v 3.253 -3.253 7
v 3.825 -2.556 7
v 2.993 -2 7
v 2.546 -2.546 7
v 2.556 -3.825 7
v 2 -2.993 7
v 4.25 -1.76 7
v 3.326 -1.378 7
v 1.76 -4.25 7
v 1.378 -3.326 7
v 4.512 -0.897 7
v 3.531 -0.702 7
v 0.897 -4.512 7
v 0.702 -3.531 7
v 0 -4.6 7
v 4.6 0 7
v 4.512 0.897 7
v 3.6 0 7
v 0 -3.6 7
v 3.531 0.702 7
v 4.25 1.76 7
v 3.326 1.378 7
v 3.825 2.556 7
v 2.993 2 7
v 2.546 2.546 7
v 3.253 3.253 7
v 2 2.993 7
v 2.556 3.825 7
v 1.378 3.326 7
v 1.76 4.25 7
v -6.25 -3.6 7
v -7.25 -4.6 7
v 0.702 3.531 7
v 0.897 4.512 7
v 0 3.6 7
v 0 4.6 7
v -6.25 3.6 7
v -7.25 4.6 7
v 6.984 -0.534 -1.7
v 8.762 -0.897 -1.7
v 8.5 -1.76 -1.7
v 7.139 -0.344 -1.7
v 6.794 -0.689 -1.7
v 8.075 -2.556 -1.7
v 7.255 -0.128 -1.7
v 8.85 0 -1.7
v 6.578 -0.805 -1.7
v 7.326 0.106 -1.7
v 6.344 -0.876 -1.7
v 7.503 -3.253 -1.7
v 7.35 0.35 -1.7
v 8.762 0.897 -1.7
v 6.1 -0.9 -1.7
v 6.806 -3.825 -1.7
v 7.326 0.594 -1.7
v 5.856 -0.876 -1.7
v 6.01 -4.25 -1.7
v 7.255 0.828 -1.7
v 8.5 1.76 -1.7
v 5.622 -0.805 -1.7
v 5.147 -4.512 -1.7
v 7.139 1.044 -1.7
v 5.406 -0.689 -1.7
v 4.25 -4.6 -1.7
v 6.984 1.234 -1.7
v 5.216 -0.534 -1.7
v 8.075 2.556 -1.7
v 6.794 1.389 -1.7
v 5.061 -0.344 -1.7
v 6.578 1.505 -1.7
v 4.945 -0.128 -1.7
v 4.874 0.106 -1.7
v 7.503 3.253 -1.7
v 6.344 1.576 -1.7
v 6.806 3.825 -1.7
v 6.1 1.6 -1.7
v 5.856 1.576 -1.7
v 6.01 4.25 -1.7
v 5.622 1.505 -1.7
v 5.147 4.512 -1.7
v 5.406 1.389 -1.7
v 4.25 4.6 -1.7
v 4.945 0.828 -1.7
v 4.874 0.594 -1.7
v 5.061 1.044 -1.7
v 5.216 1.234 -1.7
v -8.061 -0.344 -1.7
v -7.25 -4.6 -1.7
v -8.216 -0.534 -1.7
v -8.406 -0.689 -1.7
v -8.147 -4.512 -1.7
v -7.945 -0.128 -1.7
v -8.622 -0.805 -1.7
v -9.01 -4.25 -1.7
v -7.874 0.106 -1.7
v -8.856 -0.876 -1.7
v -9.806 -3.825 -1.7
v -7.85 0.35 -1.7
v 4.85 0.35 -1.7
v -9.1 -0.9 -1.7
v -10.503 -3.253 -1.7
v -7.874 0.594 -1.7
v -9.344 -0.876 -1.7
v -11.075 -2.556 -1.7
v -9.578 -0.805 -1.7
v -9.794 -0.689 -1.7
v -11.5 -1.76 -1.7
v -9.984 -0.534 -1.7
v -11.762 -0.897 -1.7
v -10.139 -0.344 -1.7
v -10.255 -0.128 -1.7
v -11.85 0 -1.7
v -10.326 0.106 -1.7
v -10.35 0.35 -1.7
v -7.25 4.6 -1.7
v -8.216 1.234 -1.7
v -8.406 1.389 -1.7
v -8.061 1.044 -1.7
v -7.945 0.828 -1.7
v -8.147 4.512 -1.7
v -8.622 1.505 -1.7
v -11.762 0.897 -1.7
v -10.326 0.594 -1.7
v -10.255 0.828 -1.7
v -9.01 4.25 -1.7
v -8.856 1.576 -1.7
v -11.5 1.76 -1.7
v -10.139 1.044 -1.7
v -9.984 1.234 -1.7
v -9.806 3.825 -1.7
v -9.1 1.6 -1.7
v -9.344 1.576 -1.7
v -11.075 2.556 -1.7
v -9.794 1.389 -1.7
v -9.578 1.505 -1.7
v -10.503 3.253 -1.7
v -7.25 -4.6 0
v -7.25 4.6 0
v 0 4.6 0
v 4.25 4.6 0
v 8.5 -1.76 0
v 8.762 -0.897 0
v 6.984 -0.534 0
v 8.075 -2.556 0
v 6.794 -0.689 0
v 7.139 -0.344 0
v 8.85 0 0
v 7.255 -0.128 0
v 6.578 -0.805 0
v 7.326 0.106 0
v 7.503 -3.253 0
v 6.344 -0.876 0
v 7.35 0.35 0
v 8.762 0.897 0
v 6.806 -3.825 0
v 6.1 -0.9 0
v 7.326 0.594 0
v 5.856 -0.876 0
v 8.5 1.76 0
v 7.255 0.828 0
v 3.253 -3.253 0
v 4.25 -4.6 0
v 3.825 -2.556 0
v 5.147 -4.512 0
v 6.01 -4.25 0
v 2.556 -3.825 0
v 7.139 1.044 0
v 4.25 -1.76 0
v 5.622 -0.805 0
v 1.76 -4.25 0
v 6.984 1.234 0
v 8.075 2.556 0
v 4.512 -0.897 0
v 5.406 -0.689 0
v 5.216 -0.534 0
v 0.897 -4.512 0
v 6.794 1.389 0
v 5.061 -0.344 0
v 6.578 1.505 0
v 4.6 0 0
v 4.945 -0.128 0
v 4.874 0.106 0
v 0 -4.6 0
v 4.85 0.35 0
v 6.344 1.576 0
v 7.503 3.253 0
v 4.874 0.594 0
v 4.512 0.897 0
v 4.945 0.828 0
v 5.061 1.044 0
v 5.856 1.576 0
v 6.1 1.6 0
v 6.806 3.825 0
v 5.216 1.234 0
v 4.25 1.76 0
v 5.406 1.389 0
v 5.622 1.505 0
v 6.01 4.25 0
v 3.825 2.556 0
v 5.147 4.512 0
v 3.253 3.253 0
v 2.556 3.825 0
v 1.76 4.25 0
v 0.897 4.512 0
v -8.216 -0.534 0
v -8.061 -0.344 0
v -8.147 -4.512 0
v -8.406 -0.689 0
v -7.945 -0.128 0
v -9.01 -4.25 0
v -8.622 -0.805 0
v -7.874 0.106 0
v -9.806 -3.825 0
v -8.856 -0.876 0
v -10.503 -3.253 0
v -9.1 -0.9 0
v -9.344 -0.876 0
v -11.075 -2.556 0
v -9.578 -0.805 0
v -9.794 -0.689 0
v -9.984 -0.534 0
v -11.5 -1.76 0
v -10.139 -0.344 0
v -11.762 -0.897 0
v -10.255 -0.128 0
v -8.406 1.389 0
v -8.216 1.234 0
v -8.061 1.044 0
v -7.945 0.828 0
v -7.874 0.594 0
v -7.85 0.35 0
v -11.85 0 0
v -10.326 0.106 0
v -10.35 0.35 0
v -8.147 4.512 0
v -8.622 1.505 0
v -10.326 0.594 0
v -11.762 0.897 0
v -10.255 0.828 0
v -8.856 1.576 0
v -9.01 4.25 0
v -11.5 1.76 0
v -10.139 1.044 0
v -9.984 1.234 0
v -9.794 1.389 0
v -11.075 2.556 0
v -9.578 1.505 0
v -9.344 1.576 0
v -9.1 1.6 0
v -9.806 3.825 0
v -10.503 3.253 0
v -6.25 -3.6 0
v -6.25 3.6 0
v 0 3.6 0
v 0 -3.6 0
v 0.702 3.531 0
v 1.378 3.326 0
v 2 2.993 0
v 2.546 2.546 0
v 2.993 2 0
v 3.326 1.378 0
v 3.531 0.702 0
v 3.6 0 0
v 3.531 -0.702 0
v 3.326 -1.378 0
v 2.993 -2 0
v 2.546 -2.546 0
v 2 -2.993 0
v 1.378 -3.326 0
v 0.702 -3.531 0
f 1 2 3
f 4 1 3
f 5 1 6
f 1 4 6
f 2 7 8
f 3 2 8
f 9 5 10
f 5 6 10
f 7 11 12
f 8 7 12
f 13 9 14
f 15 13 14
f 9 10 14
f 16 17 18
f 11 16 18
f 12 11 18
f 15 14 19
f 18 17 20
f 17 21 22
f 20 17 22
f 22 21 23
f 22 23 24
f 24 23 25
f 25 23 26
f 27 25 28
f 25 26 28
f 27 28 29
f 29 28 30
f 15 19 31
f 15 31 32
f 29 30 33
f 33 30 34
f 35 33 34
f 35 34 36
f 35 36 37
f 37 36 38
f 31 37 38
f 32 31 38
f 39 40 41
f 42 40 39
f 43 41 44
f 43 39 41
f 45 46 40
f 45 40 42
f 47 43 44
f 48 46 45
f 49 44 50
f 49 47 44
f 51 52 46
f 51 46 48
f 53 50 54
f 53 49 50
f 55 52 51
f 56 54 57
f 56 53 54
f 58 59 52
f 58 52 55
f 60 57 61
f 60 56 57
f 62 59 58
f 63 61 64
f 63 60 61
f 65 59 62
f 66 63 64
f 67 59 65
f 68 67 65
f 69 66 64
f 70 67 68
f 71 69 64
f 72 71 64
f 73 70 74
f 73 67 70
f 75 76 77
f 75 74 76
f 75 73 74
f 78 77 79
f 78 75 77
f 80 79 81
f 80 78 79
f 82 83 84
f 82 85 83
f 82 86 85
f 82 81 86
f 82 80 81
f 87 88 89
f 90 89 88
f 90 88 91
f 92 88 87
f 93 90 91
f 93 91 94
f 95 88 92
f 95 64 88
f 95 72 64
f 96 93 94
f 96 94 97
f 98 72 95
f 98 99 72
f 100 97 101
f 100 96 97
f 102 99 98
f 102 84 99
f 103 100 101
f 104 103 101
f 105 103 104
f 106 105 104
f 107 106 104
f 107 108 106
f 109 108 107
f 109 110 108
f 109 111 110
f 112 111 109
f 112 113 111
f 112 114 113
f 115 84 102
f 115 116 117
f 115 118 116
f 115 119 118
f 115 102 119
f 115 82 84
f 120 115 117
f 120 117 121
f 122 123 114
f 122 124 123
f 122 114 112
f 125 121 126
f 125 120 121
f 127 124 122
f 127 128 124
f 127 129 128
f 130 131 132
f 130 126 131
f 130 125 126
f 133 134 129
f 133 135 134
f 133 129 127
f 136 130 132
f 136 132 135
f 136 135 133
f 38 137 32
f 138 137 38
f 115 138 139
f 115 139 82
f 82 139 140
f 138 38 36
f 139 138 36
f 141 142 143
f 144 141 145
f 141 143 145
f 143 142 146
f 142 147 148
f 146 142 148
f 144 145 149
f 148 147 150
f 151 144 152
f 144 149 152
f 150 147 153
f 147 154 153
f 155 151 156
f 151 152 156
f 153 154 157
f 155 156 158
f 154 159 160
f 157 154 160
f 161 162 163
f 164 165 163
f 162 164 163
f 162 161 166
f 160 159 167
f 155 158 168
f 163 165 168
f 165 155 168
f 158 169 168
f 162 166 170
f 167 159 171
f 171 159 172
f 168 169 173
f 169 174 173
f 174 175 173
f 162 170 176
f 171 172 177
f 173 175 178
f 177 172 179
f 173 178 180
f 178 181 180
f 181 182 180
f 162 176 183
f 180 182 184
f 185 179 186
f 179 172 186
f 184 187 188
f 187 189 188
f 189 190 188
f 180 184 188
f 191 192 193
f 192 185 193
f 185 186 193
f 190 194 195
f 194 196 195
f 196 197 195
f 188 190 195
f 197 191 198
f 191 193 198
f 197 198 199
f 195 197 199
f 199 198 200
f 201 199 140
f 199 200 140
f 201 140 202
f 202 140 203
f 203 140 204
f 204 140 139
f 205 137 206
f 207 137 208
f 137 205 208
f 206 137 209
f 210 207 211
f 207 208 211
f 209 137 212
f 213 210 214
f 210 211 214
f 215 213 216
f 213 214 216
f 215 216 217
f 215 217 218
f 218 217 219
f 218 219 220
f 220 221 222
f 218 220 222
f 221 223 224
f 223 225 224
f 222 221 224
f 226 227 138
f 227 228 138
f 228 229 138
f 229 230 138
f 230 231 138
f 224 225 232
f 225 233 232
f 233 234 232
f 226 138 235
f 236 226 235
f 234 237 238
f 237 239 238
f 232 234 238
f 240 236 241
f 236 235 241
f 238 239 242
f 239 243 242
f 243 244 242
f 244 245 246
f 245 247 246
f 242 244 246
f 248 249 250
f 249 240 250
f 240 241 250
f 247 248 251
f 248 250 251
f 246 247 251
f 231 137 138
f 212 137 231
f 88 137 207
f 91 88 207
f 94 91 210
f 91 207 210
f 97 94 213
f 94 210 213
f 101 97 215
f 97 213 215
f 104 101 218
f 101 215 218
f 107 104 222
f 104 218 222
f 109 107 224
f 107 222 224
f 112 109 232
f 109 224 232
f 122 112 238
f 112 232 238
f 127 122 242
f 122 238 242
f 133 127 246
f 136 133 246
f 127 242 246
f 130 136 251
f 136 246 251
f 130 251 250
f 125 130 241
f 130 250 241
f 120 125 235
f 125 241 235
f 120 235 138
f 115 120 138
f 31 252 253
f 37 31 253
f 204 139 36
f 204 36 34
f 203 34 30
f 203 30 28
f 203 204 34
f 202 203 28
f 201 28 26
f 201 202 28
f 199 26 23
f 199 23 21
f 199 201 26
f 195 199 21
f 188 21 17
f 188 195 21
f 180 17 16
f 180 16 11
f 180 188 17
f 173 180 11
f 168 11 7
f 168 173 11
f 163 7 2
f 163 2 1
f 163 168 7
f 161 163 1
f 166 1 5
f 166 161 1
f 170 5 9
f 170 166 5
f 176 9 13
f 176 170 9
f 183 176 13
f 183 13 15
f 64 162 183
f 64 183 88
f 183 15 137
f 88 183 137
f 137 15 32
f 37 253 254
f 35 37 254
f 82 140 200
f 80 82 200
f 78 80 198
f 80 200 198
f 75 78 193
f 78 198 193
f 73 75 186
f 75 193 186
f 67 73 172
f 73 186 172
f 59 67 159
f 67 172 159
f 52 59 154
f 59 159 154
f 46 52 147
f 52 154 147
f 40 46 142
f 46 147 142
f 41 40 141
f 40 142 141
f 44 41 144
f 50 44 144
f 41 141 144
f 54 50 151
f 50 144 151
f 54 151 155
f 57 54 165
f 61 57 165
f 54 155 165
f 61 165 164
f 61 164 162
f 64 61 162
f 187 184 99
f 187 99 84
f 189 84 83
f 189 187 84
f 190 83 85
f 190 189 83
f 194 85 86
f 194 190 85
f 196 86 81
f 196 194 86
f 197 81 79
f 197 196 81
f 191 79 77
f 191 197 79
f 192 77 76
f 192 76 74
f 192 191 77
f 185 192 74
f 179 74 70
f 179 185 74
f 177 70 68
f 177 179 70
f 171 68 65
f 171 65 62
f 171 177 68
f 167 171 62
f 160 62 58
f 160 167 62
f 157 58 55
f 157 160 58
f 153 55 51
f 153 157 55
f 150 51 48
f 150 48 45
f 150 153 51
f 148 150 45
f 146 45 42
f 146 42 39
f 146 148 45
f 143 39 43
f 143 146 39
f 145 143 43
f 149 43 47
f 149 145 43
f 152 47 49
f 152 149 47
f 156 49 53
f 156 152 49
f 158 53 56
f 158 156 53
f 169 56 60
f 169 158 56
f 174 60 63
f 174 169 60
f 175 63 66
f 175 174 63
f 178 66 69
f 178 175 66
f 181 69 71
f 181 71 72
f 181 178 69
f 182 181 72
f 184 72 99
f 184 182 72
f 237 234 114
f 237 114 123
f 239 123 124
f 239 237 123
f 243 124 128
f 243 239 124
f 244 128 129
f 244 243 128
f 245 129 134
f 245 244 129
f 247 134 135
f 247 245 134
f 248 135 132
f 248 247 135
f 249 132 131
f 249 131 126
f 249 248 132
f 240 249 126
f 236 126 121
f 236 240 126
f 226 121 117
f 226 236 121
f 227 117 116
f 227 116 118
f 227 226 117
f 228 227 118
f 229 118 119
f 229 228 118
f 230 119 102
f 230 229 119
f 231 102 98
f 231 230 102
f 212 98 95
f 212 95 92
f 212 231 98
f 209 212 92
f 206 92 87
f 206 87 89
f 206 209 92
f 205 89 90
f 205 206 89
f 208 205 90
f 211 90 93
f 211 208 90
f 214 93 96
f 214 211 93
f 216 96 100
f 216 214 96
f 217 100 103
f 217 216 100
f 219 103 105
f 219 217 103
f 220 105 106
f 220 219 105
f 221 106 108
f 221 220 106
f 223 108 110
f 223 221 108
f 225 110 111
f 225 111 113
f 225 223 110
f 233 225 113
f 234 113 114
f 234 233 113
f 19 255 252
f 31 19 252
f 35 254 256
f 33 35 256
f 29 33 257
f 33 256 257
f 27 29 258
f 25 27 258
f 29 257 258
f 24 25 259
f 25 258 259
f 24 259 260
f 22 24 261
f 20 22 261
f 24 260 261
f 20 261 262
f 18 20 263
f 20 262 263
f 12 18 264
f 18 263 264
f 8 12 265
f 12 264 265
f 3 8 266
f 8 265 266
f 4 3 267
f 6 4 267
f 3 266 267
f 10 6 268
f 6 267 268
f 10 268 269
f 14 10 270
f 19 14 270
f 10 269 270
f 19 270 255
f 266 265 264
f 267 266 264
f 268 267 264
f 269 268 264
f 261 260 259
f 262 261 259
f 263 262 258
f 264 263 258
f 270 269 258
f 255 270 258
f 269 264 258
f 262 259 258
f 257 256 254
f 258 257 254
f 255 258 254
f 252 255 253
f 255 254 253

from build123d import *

# Parameters (mm, degrees)
BOSS_EXTRU_1_DEPTH = 7
ESQUISSE2_R        = 1.25
BOSS_EXTRU_2_DEPTH = 1.7


with BuildPart() as part:
    # Esquisse1 → Boss.-Extru.1 (new body)
    with BuildSketch(Plane.XY):
        with BuildLine():
            Line((-7.25, -4.6), (-7.25, 4.6))
            Line((-7.25, 4.6), (0, 4.6))
            ThreePointArc((0, 4.6), (4.6, 0), (0, -4.6))
            Line((0, -4.6), (-7.25, -4.6))
        make_face()
        with BuildLine():
            Line((-6.25, -3.6), (-6.25, 3.6))
            Line((-6.25, 3.6), (0, 3.6))
            ThreePointArc((0, 3.6), (3.6, 0), (0, -3.6))
            Line((0, -3.6), (-6.25, -3.6))
        make_face(mode=Mode.SUBTRACT)
    extrude(amount=BOSS_EXTRU_1_DEPTH)

    # Esquisse2 → Boss.-Extru.2 (add)
    with BuildSketch(Plane(origin=(0, 0, 0), x_dir=(-1, 0, 0), z_dir=(0, 0, -1))):
        with BuildLine():
            Line((7.25, 4.6), (-4.25, 4.6))
            ThreePointArc((-4.25, 4.6), (-8.85, 0), (-4.25, -4.6))
            Line((-4.25, -4.6), (7.25, -4.6))
            ThreePointArc((7.25, -4.6), (11.85, 0), (7.25, 4.6))
        make_face()
        with Locations((9.1, 0.35)):
            Circle(ESQUISSE2_R, mode=Mode.SUBTRACT)
        with Locations((-6.1, 0.35)):
            Circle(ESQUISSE2_R, mode=Mode.SUBTRACT)
    extrude(amount=BOSS_EXTRU_2_DEPTH)


solid = part.part
